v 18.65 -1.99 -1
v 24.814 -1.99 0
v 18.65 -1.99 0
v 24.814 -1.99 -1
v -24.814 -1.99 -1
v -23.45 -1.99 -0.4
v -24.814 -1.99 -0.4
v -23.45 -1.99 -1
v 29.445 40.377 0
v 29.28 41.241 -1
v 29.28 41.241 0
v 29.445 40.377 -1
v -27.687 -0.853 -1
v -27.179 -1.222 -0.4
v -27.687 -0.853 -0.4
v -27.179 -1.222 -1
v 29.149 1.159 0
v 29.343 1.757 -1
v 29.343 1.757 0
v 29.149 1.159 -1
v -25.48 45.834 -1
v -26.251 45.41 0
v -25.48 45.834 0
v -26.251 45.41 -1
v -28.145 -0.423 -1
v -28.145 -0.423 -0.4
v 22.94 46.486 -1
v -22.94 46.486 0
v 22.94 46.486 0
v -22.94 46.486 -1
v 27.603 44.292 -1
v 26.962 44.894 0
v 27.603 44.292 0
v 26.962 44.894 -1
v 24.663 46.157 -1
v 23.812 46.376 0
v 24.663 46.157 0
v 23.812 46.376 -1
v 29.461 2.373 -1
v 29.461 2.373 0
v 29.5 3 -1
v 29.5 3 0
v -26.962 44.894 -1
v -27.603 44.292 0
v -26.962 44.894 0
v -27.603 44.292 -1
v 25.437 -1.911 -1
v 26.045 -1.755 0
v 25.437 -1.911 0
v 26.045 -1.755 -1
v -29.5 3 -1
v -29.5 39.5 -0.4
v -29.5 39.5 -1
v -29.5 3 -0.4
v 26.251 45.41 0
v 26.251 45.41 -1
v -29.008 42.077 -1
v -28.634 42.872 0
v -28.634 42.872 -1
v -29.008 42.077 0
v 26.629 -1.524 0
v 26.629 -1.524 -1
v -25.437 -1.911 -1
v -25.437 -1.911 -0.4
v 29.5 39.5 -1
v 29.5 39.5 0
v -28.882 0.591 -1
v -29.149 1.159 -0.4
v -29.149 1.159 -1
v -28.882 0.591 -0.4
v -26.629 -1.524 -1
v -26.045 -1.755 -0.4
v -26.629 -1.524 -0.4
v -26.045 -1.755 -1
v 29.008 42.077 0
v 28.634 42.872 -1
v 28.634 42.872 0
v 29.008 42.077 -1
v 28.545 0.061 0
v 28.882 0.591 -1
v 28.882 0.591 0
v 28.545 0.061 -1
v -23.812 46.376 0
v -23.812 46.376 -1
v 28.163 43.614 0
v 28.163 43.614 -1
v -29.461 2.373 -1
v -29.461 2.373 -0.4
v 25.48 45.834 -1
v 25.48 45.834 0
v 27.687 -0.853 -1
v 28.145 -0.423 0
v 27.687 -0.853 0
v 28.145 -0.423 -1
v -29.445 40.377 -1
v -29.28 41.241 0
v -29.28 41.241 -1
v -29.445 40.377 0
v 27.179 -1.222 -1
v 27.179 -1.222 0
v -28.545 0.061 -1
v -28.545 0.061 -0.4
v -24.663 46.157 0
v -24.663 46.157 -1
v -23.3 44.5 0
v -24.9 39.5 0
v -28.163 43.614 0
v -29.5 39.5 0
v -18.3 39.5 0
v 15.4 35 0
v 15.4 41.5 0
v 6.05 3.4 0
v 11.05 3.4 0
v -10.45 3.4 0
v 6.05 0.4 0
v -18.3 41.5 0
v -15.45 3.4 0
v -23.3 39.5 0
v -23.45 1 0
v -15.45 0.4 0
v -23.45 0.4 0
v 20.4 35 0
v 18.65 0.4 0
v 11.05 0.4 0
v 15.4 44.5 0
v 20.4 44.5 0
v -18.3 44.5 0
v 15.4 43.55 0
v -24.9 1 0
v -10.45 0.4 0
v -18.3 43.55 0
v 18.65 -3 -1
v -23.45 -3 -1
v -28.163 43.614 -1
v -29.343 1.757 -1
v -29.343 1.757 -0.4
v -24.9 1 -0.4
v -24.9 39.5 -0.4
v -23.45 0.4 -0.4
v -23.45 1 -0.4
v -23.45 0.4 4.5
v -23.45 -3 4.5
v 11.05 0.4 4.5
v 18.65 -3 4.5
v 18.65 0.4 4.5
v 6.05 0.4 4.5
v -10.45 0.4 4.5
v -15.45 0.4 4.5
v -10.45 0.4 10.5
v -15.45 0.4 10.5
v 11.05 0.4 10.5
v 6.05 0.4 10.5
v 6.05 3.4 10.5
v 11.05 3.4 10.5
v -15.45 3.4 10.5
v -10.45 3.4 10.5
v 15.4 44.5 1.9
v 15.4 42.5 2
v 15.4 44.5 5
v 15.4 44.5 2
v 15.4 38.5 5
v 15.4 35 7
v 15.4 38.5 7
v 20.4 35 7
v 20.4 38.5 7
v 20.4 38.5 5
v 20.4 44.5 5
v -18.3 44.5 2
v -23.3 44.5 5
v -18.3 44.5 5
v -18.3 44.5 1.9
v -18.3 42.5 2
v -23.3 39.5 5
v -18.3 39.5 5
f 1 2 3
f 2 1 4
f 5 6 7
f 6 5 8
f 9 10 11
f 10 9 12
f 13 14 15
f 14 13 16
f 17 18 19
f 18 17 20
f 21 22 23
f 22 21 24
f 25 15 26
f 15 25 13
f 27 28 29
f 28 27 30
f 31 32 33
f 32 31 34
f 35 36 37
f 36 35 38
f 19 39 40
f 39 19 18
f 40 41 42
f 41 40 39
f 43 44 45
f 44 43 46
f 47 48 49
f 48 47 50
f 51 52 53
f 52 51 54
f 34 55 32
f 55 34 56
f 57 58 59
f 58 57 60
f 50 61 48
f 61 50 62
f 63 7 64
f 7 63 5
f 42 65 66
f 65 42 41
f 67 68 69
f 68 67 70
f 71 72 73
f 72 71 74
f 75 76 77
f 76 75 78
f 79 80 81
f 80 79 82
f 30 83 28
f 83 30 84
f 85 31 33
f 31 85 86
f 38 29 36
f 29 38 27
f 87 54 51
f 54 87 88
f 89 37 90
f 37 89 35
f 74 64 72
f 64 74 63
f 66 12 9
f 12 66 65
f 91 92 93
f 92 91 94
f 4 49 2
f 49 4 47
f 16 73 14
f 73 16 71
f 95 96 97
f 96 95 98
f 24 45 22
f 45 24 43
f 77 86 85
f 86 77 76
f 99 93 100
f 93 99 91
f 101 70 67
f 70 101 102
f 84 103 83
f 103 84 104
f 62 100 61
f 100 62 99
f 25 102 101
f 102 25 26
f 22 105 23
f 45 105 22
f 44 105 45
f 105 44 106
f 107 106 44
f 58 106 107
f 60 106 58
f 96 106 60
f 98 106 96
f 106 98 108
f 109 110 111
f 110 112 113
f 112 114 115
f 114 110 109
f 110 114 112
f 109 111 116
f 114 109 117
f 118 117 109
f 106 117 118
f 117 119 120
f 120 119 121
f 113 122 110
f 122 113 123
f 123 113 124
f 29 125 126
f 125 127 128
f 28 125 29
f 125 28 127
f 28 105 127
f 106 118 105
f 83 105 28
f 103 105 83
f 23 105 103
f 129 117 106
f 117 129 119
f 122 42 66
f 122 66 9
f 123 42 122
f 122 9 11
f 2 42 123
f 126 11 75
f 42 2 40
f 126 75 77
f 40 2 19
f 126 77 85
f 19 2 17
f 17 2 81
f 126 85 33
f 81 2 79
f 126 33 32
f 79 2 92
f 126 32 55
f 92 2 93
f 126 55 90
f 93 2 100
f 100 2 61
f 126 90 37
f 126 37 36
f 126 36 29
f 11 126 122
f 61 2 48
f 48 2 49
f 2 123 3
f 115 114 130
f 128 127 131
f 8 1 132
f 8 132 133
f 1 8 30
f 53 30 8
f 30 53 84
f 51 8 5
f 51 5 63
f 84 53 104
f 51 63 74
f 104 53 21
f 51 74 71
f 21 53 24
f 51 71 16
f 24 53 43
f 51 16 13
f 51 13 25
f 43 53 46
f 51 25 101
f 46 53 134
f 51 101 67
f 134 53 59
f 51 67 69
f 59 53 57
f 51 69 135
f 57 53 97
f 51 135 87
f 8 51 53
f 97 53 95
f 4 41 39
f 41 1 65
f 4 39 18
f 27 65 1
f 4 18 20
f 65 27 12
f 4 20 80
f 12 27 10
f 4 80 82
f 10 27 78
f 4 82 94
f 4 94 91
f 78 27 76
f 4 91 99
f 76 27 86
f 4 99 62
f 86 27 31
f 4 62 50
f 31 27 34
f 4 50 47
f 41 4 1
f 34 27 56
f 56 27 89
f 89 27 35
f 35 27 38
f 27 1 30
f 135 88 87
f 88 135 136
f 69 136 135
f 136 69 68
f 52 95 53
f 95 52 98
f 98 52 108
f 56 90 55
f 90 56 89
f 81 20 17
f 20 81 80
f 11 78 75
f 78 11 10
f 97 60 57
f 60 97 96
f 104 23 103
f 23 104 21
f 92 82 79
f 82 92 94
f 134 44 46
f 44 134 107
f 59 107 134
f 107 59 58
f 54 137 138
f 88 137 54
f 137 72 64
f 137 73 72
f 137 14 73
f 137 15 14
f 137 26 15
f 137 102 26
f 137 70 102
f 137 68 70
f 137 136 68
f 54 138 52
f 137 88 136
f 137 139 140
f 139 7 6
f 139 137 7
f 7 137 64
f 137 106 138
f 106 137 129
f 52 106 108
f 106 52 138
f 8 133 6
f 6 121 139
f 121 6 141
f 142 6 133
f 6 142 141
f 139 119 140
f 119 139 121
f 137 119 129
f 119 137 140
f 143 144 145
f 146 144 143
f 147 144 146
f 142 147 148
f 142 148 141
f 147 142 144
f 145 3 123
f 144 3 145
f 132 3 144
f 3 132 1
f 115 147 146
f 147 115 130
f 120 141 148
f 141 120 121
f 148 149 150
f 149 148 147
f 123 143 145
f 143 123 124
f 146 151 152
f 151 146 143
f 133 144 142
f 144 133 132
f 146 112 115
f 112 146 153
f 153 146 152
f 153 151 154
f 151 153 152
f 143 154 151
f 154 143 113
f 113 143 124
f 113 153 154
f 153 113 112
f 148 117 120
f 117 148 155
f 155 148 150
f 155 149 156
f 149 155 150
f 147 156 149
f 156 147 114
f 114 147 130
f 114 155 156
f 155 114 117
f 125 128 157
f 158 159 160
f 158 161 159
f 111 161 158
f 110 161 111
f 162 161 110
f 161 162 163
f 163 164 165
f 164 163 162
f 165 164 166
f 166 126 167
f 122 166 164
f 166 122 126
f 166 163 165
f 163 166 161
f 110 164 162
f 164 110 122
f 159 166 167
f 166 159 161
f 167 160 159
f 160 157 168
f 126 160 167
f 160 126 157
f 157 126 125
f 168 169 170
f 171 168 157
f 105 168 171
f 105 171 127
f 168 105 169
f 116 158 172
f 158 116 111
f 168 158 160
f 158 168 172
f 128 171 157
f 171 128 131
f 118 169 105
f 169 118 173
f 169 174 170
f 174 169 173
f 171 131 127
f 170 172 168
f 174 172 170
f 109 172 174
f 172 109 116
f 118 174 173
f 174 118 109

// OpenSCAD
base_h=35.5;
base_w=17;
base_t=3.0;
base_space=base_h+7; //42;

fix_h=4.5;
fix_w=7;
fix_d=24/2;

arm_t=1.5;
arm_l=46.5;
arm_w=10;
arm_dist=35/2;
arm_hole=4;
arm_hole_l1=15;
arm_hole_l2=30;

side_t=1.6;
full_h=59;
full_w=21.5;
back_r=5;
front_r=7;
sw_hole=3;
sw_t=1.6;
b_o=1;

motor_hole_w=10;
motor_hole_l=30;
motor_shift=2.2;

//micro switch
msw_w=6+0.6;
msw_h=7;
msw_l=13;
msw_t=1.6;
msw_conn=3;

// cap
cap_t=1.0;
cap_sp=0.4; // space
cap_fix_h=5;
cap_fix_t=2;
cap_fix_w=5;
cap_fix_ofs=4.5;
lock_h=2;
lock_w=30;

module arm()
{
	hull()
	{
		translate([0, arm_hole_l1, -arm_t-1]) cylinder(h=arm_t+2, d=arm_hole, $fn=20);
		translate([0, arm_hole_l2, -arm_t-1]) cylinder(h=arm_t+2, d=arm_hole, $fn=20);
	}
}

module sides(hh, r_b, r_f, b, shrink)
{
	hull()
	{
	translate([ full_h/2-r_b, r_b-side_ofs, -b]) cylinder(h=hh+arm_t, r=r_b-shrink);
	translate([-full_h/2+r_b, r_b-side_ofs, -b]) cylinder(h=hh+arm_t, r=r_b-shrink);
	translate([ full_h/2-r_f, arm_l-r_f, -b]) cylinder(h=hh+arm_t, r=r_f-shrink);
	translate([-full_h/2+r_f, arm_l-r_f, -b]) cylinder(h=hh+arm_t, r=r_f-shrink);
	}
}

side_ofs=base_t-b_o;

module base()
{
	translate([motor_shift,0,0]) difference()
	{
		translate([-base_h/2, -base_t, -arm_t]) cube([base_h, base_t, base_w+arm_t]);
		translate([-fix_d-fix_h/2, -base_t-1, arm_w/2]) cube([fix_h, 2, fix_w]);
		translate([ fix_d-fix_h/2, -base_t-1, arm_w/2]) cube([fix_h, 2, fix_w]);
	}

	difference()
	{
		sides(full_w, back_r, front_r, arm_t, 0, $fn=70);
		sides(full_w+2, back_r, front_r, 0, side_t, $fn=40);
		translate([-base_space/2+motor_shift, -side_t-1, 0]) cube([base_space+sw_hole, side_t+2, full_w+1]);
		mirror([1,0,0])
		translate([-arm_dist-motor_shift, 0, 0]) arm();
		translate([-arm_dist+motor_shift, 0, 0]) arm();
		//translate([-motor_hole_w/2+motor_shift, 0, -base_t-1]) cube([motor_hole_w, arm_l-side_t, base_t+2]);
		hull()
		{
			translate([motor_shift, motor_hole_w/2, -base_t-1]) cylinder(d=motor_hole_w, h=base_t+2, $fn=30);
			translate([motor_shift, -motor_hole_w/2+motor_hole_l, -base_t-1]) cylinder(d=motor_hole_w, h=base_t+2, $fn=30);
		}
		
		
		translate([full_h/2-sw_t-sw_hole, back_r-side_ofs, -arm_t-1]) cube([sw_hole, arm_l+side_ofs-back_r-front_r, arm_t+full_w+2]);
		translate([full_h/2-sw_t-sw_hole/2, arm_l-front_r, -arm_t-1]) cylinder(h=arm_t+full_w+2, r=sw_hole/2, $fn=10);
		intersection()
		{
			translate([ full_h/2-back_r, back_r-side_ofs, -arm_t-1]) cylinder(h=full_w+arm_t+2, r=back_r-sw_t, $fn=30);
			translate([ full_h/2-sw_t-sw_hole, back_r-side_ofs-10+0.01, -arm_t-1]) cube([10,10,full_w+arm_t+2]);
		}
		translate([+base_space/2+motor_shift, -side_t-1, -arm_t-1]) cube([sw_hole, side_t+2, full_w+1]);

	}

	translate([full_h/2-sw_t-sw_hole-msw_h-msw_t+msw_h+msw_t-side_t, back_r-side_ofs+msw_w+msw_t*2-side_t, 0]) 
	cube([side_t, arm_l-(back_r-side_ofs)-(msw_w+msw_t*2), full_w]);
	// microswitch
	translate([full_h/2-sw_t-sw_hole-msw_h-msw_t, back_r-side_ofs, 0]) 
	difference()
	{
		cube([msw_h+msw_t, msw_w+msw_t*2, msw_l]);
		translate([msw_t, msw_t, 0]) cube([msw_h+1, msw_w, msw_l+1]);
		translate([-1, msw_t+msw_w/2-msw_conn/2, 0]) cube([msw_t+2, msw_conn, msw_l+1]);
	}

	// PCB holder
	translate([-full_h/2+side_t+2+1.5+1.5+2.5, 35, 0]) cube([5, 3.5, 12]);
	translate([-full_h/2+side_t+2+1.5, 35, 0]) cube([5+1.5+2.5, 3.5, 2]);
	translate([-full_h/2+side_t+2+1.5, 12, 0]) cube([1.8, 30, 2]);

	%translate([-full_h/2+side_t+2, 0, 0])
	{
		color("green") cube([1.5, 43.2, 21]);
		color("blue") translate([1.5,21.9,3])cube([1.5, 21, 16]);
		color("grey") translate([3,23.5,5])cube([2.5, 15, 12]);
	}

	// lock
	hull()
	{
		translate([-lock_w/2, arm_l-side_t-lock_h/2, full_w-0.1]) cube([lock_w, side_t, 0.1]);
		translate([-lock_w/2, arm_l-side_t, full_w-lock_h]) cube([lock_w, side_t, 0.1]);
	}
}

module cap()
{
  difference()
	{
		hull()
		{
			$fn=50;
			translate([ full_h/2-back_r, back_r-side_ofs, 0]) cylinder(h=cap_t, r=back_r);
			translate([-full_h/2+back_r, back_r-side_ofs, 0]) cylinder(h=cap_t, r=back_r);
			translate([ full_h/2-front_r, arm_l-front_r, 0]) cylinder(h=cap_t, r=front_r);
			translate([-full_h/2+front_r, arm_l-front_r, 0]) cylinder(h=cap_t, r=front_r);
		}
		translate([full_h/2-sw_t-sw_hole, back_r-side_ofs-100, -cap_t+cap_sp]) cube([sw_hole+100, arm_l+side_ofs-back_r-front_r+100, cap_t]);
		translate([+base_space/2+motor_shift, -side_t-1, -cap_t+cap_sp]) cube([sw_hole, side_t+2, cap_t]);
	}
	translate([motor_shift-base_space/2+cap_sp, -base_t, -full_w+base_w]) cube([base_space-cap_sp, base_t+cap_sp, full_w-base_w+cap_t]);
	translate([motor_shift-base_h/2+cap_fix_ofs, cap_sp, -(full_w-base_w+cap_t+cap_fix_h)]) cube([cap_fix_w, 3, full_w-base_w+cap_t+cap_fix_h]);
	translate([motor_shift+base_h/2-cap_fix_ofs-cap_fix_w, cap_sp, -(full_w-base_w+cap_t+cap_fix_h)]) cube([cap_fix_w, 3, full_w-base_w+cap_t+cap_fix_h]);
	translate([-full_h/2+side_t+2+1.5+1.5+2.5, 35, -cap_fix_h-2]) cube([5, 3.5, cap_fix_h+2]);
	translate([-full_h/2+side_t+2+1.5+1.5+2.5, 35, -cap_fix_h]) cube([5, arm_l-35-side_t-cap_sp, cap_fix_h]);

	// front lock
	hull()
	{
		translate([-full_h/2+side_t+2+1.5+1.5+2.5, arm_l-side_t-2-cap_sp-lock_h/2,  0]) cube([full_h-front_r-side_t-(2+1.5+1.5+2.5), 2, 0.1]);
		translate([-full_h/2+side_t+2+1.5+1.5+2.5, arm_l-side_t-2-cap_sp, -lock_h]) cube([full_h-front_r-side_t-(2+1.5+1.5+2.5), 2, 0.1]);
	}

	translate([full_h/2-sw_t-sw_hole-side_t-5, 35-5+arm_l-35-side_t-cap_sp, -cap_fix_h]) cube([5, 5, cap_fix_h]);
	// mswitch
//	translate([full_h/2-sw_t-sw_hole-msw_h-msw_t, back_r-side_ofs, -(full_w-msw_l)]) 
//		cube([msw_h+msw_t, msw_w+msw_t*2, full_w-msw_l]);
}

//base(); //translate([0, 0, full_w+0.2]) cap();
rotate([0,180,0]) cap();
